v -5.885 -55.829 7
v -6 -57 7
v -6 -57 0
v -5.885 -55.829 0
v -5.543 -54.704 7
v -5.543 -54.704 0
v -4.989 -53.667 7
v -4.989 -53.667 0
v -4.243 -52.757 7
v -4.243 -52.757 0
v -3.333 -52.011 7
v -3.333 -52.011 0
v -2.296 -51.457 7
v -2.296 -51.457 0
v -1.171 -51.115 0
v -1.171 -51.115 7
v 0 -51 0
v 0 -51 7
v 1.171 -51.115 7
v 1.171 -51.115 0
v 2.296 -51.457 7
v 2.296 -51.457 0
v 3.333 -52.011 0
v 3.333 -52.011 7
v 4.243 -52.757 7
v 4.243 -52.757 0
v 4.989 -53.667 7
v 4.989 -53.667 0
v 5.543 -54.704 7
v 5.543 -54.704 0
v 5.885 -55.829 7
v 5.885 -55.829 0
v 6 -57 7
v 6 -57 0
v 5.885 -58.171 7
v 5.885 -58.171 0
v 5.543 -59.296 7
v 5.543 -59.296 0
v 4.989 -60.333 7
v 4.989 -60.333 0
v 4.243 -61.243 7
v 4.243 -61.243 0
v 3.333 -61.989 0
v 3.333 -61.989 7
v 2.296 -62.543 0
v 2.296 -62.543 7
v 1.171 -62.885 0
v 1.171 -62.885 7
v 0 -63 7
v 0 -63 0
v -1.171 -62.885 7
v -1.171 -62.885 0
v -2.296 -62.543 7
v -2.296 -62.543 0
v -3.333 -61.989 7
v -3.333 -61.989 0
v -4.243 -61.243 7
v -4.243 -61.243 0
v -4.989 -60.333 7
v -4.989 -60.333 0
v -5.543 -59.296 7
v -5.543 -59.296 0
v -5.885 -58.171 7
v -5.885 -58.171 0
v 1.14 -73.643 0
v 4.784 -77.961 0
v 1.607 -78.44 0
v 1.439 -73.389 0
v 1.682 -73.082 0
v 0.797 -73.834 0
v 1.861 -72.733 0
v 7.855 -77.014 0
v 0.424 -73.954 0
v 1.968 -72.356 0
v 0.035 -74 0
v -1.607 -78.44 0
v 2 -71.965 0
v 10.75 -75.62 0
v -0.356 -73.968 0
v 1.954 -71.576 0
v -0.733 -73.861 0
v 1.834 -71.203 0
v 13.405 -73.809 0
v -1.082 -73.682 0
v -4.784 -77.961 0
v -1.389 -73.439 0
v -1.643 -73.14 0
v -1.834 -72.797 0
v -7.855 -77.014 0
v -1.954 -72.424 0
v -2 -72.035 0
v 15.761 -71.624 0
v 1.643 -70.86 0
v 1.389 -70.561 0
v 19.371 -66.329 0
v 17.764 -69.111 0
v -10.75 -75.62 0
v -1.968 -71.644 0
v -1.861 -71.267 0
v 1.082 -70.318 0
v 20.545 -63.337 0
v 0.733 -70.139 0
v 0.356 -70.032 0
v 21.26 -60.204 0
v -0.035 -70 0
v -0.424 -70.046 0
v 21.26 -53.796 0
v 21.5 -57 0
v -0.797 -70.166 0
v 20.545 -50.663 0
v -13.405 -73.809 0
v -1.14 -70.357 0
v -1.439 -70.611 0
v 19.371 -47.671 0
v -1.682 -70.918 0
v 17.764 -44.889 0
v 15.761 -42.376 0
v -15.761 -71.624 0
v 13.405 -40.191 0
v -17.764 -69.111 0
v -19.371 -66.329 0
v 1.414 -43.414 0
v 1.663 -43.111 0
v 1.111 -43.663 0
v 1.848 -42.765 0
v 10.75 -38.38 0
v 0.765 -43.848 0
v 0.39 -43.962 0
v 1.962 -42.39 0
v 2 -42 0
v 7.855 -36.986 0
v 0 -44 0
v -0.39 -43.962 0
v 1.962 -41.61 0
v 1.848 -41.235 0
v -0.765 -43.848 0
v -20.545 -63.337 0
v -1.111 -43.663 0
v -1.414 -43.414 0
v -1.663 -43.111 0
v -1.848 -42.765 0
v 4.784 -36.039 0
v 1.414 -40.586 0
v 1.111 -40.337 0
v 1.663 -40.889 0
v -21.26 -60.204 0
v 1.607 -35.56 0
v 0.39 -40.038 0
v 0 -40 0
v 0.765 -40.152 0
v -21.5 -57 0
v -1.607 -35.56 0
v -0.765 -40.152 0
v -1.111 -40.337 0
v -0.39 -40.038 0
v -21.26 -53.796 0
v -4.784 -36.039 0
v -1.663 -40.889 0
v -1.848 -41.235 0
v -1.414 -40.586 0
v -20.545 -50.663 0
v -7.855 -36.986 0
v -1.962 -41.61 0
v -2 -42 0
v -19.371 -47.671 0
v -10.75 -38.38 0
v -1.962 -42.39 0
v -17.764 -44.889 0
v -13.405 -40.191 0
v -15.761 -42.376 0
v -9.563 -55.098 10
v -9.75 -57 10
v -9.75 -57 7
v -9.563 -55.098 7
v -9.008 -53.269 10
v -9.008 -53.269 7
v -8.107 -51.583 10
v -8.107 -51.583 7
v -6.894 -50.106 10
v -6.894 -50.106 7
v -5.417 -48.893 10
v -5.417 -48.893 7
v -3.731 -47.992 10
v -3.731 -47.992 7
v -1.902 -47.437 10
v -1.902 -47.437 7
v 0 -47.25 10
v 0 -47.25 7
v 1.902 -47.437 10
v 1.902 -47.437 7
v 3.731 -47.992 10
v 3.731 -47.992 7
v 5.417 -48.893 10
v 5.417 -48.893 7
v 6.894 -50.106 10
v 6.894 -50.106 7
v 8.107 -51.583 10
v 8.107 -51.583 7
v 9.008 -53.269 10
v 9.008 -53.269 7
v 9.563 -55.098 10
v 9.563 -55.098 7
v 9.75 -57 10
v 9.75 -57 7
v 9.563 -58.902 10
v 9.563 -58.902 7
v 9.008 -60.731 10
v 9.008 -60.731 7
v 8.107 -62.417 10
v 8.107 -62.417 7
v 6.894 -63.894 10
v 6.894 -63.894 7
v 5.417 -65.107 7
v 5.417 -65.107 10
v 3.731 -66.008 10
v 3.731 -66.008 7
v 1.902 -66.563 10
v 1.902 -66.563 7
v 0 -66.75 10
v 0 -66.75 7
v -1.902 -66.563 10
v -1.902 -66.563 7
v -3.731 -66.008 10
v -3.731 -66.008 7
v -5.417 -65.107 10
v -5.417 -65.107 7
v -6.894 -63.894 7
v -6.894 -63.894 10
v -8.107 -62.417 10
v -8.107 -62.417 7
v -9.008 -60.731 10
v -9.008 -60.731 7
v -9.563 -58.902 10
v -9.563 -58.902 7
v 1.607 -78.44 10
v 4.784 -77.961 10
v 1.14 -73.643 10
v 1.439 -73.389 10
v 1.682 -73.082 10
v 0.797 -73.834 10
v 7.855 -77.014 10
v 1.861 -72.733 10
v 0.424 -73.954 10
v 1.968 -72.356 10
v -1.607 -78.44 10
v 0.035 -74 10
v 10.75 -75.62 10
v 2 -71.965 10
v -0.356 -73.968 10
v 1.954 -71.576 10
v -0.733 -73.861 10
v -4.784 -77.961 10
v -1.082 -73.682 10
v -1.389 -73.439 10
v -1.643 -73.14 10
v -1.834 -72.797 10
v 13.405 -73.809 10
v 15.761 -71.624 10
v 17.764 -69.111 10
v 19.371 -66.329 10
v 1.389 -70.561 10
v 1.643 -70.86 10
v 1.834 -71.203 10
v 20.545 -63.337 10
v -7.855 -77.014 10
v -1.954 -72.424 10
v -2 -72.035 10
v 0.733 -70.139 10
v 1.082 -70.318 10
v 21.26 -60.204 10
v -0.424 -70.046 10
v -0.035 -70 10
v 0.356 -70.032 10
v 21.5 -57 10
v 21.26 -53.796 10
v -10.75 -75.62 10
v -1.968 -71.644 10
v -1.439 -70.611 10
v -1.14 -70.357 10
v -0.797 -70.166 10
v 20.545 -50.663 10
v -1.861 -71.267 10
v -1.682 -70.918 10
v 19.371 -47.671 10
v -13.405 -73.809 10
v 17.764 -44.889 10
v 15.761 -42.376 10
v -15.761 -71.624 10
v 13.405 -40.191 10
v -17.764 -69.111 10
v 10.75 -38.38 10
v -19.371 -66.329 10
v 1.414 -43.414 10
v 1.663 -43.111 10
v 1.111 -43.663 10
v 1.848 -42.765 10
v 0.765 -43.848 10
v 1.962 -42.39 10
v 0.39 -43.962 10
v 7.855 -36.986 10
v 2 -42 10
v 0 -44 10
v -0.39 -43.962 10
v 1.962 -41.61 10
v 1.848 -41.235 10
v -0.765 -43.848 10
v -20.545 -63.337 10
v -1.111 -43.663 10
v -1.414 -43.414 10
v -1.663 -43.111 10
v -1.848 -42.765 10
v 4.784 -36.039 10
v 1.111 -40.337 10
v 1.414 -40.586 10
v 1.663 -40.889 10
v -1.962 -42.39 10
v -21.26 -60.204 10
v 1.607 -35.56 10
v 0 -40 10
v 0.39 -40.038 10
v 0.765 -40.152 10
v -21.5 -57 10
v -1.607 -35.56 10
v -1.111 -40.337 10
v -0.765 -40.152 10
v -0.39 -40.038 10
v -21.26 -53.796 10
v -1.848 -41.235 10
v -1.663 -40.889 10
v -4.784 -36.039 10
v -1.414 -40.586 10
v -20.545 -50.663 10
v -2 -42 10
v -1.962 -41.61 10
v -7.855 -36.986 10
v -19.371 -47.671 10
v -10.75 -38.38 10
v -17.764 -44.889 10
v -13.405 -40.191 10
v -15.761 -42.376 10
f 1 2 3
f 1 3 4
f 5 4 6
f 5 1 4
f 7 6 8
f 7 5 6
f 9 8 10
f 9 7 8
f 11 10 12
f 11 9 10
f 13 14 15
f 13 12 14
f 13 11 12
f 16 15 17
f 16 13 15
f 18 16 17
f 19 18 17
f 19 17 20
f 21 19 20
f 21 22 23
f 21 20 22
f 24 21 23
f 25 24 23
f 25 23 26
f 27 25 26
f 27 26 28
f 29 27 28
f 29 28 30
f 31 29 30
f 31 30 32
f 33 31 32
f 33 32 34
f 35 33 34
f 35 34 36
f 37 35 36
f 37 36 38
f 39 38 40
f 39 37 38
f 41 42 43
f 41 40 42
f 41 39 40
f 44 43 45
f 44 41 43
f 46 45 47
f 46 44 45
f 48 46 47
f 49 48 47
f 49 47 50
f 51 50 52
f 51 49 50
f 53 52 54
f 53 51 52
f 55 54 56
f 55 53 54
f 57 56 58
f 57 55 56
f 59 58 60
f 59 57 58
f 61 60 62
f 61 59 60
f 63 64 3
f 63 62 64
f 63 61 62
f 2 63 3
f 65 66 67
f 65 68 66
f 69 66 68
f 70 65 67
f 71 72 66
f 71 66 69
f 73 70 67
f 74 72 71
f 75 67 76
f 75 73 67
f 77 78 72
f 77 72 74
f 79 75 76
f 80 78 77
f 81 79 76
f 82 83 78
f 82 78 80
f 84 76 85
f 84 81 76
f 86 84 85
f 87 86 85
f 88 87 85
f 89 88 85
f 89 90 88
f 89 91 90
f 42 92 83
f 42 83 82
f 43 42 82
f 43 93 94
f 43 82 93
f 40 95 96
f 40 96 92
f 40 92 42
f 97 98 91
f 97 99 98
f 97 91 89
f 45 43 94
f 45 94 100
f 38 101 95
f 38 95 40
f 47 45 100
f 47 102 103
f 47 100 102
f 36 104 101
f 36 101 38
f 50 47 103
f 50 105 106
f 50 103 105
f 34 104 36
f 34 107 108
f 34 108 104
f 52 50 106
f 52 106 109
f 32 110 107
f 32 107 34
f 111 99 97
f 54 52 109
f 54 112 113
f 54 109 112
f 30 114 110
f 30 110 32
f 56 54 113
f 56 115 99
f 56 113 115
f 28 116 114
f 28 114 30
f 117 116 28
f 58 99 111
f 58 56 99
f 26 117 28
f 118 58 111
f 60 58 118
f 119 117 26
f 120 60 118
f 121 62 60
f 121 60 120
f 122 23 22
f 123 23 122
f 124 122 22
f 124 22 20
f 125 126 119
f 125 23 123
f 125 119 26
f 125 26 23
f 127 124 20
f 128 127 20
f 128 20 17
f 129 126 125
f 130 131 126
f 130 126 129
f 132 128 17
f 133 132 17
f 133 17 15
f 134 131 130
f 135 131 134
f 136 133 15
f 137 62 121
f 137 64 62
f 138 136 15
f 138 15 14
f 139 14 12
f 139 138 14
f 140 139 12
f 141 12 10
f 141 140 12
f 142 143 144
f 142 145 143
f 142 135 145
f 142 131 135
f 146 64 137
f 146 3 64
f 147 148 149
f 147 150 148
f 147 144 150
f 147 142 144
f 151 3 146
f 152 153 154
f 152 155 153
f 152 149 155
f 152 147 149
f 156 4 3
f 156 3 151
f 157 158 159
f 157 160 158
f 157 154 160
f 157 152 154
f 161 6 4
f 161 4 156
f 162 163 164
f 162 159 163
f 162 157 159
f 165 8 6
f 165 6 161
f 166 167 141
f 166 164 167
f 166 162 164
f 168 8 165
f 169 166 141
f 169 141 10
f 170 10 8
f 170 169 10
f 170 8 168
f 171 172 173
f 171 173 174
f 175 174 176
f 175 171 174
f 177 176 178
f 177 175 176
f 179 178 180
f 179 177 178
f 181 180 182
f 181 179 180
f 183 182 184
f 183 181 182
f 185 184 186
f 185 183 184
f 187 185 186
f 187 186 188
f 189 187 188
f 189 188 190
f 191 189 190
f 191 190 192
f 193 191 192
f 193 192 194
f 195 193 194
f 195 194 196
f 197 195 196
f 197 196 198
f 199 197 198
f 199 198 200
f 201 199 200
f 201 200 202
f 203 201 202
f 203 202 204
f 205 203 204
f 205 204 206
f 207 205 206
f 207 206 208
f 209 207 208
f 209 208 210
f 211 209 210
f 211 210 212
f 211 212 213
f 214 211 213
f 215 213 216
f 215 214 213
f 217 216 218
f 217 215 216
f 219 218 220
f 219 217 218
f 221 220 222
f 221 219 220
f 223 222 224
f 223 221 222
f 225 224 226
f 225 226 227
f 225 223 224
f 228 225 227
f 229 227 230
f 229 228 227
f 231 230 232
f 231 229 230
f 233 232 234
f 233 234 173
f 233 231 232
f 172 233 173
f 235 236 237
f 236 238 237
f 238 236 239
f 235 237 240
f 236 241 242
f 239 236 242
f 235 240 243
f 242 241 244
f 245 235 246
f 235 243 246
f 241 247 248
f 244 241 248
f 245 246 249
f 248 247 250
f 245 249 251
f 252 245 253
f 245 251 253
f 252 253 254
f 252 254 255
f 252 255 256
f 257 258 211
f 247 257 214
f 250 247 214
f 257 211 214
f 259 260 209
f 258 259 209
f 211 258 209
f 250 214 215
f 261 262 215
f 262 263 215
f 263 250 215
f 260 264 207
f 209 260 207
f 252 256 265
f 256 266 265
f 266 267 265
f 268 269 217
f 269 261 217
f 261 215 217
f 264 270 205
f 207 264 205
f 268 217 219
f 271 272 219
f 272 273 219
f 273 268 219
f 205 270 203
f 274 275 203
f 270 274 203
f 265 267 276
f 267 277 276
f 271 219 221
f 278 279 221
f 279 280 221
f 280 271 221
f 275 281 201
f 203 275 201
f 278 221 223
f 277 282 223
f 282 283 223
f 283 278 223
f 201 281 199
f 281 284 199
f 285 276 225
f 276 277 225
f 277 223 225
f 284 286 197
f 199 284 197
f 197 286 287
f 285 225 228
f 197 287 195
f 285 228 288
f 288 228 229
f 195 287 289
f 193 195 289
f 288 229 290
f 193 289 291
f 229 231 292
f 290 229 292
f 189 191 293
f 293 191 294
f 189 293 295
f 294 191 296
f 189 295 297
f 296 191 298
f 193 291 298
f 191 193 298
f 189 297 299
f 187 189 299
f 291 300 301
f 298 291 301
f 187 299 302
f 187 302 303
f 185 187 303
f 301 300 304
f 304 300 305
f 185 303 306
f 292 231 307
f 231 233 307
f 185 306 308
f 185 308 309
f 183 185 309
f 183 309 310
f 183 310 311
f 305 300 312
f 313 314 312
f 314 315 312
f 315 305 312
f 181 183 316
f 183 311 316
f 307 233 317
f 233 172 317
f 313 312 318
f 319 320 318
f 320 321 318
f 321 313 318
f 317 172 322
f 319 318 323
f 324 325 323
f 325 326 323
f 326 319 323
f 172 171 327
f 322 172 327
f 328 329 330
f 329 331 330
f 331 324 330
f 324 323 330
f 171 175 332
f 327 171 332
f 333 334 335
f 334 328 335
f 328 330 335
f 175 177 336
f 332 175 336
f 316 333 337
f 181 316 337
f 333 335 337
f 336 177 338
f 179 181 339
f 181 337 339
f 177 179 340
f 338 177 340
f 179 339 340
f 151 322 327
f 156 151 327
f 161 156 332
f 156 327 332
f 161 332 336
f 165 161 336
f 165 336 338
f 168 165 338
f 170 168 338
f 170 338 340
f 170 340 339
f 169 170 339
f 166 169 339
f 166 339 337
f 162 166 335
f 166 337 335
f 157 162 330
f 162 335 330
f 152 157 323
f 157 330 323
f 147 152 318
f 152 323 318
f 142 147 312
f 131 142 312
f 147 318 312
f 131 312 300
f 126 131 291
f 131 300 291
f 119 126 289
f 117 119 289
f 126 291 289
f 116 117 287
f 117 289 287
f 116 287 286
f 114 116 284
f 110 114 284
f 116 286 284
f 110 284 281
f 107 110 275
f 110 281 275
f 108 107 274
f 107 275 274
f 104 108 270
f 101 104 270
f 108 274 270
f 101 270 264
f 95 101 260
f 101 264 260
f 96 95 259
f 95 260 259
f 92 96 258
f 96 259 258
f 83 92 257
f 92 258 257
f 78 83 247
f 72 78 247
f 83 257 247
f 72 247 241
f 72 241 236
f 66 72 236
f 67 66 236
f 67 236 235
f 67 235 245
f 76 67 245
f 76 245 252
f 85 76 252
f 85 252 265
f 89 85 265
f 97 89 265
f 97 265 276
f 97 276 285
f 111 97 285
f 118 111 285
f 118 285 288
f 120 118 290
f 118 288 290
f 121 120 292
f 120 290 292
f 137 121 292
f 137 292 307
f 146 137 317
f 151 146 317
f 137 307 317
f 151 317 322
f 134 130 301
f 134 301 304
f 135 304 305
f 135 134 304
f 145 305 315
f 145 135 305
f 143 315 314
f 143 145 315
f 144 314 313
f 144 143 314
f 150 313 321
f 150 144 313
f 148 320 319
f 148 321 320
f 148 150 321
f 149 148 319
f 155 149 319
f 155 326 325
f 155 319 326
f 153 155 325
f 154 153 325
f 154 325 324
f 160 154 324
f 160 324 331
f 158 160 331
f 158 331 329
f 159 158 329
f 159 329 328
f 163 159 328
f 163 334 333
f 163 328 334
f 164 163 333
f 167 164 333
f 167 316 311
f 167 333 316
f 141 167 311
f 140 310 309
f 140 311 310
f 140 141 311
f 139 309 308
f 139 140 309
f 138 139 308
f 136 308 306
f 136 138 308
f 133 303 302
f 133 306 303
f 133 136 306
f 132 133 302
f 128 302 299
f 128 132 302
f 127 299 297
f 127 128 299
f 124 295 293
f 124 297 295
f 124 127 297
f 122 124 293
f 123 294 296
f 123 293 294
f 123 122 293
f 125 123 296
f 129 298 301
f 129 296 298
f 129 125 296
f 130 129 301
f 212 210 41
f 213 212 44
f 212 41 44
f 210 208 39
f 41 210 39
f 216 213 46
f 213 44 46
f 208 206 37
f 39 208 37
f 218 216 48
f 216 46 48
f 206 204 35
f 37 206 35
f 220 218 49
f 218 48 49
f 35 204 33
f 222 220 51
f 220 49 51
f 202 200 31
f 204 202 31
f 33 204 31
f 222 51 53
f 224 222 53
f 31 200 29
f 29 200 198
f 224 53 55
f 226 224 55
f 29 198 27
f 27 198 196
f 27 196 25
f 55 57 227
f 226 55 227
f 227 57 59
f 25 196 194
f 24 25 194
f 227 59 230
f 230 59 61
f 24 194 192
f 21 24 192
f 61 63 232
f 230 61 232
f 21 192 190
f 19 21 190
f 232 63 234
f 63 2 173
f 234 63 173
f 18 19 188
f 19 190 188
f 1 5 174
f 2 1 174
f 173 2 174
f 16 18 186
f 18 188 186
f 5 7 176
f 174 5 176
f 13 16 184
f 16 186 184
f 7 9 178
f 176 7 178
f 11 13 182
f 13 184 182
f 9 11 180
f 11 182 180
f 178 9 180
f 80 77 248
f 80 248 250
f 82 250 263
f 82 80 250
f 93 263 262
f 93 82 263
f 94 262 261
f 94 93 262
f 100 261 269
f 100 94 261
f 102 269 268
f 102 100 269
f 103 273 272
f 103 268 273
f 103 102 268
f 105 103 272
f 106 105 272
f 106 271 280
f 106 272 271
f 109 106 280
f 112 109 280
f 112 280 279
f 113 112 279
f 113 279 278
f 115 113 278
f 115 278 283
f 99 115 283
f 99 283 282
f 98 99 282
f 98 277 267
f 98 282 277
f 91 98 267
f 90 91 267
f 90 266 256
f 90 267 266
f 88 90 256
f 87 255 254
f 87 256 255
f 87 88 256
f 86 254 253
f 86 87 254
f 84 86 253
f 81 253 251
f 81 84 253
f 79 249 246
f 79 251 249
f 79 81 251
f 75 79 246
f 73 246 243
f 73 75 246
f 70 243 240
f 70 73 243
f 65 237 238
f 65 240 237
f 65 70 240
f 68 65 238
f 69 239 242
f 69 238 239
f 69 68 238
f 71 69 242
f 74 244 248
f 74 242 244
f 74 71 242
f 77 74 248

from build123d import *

# Parameters (mm, degrees)
CYLINDER010_R               = 2
CYLINDER010_DEPTH           = 15
CYLINDER011_R               = 2
CYLINDER011_DEPTH           = 15
CYLINDER011_PLACEMENT_ANGLE = 1
CYLINDER009_R               = 6
CYLINDER009_DEPTH           = 20
CYLINDER007_R               = 9.75
CYLINDER007_DEPTH           = 6
CYLINDER003_R               = 21.5
CYLINDER003_DEPTH           = 10
CUT005_PLACEMENT_ANGLE      = 180


with BuildPart() as cylinder010:
    # Cylinder010 → Cylinder010 (new body)
    with BuildSketch(Plane(origin=(0, 15, -1), x_dir=(1, 0, 0), z_dir=(0, 0, 1))):
        Circle(CYLINDER010_R)
    extrude(amount=CYLINDER010_DEPTH)


with BuildPart() as fusion003:
    # Cylinder011 → Cylinder011 (new body)
    with BuildSketch(Plane.XY):
        Circle(CYLINDER011_R)
    extrude(amount=CYLINDER011_DEPTH)


with BuildPart() as fusion003_1:
    # Cylinder011 placement: moved
    add(fusion003.part.moved(Location((0, -15, -1))).rotate(Axis((0, -15, -1), (0, 0, 1)), CYLINDER011_PLACEMENT_ANGLE))

    # Fusion003: union Cylinder010
    add(cylinder010.part)


with BuildPart() as cylinder009:
    # Cylinder009 → Cylinder009 (new body)
    with BuildSketch(Plane.XY):
        Circle(CYLINDER009_R)
    extrude(amount=CYLINDER009_DEPTH)


with BuildPart() as cylinder007:
    # Cylinder007 → Cylinder007 (new body)
    with BuildSketch(Plane.XY):
        Circle(CYLINDER007_R)
    extrude(amount=CYLINDER007_DEPTH)


with BuildPart() as small_bearing_ring001:
    # Cylinder003 → Cylinder003 (new body)
    with BuildSketch(Plane.XY.offset(3)):
        Circle(CYLINDER003_R)
    extrude(amount=CYLINDER003_DEPTH)

    # Cut006: cut Cylinder007
    add(cylinder007.part, mode=Mode.SUBTRACT)

    # Cut005: cut Cylinder009
    add(cylinder009.part, mode=Mode.SUBTRACT)


with BuildPart() as small_bearing_ring001_1:
    # Cut005 placement: moved
    add(small_bearing_ring001.part.moved(Location((0, 0, 13))).rotate(Axis((0, 0, 13), (0, 1, 0)), CUT005_PLACEMENT_ANGLE))

    # Cut008: cut Fusion003
    add(fusion003_1.part, mode=Mode.SUBTRACT)


with BuildPart() as small_bearing_ring001_2:
    # Cut008 placement: moved
    add(small_bearing_ring001_1.part.moved(Location((0, -57, 0))))


solid = small_bearing_ring001_2.part
